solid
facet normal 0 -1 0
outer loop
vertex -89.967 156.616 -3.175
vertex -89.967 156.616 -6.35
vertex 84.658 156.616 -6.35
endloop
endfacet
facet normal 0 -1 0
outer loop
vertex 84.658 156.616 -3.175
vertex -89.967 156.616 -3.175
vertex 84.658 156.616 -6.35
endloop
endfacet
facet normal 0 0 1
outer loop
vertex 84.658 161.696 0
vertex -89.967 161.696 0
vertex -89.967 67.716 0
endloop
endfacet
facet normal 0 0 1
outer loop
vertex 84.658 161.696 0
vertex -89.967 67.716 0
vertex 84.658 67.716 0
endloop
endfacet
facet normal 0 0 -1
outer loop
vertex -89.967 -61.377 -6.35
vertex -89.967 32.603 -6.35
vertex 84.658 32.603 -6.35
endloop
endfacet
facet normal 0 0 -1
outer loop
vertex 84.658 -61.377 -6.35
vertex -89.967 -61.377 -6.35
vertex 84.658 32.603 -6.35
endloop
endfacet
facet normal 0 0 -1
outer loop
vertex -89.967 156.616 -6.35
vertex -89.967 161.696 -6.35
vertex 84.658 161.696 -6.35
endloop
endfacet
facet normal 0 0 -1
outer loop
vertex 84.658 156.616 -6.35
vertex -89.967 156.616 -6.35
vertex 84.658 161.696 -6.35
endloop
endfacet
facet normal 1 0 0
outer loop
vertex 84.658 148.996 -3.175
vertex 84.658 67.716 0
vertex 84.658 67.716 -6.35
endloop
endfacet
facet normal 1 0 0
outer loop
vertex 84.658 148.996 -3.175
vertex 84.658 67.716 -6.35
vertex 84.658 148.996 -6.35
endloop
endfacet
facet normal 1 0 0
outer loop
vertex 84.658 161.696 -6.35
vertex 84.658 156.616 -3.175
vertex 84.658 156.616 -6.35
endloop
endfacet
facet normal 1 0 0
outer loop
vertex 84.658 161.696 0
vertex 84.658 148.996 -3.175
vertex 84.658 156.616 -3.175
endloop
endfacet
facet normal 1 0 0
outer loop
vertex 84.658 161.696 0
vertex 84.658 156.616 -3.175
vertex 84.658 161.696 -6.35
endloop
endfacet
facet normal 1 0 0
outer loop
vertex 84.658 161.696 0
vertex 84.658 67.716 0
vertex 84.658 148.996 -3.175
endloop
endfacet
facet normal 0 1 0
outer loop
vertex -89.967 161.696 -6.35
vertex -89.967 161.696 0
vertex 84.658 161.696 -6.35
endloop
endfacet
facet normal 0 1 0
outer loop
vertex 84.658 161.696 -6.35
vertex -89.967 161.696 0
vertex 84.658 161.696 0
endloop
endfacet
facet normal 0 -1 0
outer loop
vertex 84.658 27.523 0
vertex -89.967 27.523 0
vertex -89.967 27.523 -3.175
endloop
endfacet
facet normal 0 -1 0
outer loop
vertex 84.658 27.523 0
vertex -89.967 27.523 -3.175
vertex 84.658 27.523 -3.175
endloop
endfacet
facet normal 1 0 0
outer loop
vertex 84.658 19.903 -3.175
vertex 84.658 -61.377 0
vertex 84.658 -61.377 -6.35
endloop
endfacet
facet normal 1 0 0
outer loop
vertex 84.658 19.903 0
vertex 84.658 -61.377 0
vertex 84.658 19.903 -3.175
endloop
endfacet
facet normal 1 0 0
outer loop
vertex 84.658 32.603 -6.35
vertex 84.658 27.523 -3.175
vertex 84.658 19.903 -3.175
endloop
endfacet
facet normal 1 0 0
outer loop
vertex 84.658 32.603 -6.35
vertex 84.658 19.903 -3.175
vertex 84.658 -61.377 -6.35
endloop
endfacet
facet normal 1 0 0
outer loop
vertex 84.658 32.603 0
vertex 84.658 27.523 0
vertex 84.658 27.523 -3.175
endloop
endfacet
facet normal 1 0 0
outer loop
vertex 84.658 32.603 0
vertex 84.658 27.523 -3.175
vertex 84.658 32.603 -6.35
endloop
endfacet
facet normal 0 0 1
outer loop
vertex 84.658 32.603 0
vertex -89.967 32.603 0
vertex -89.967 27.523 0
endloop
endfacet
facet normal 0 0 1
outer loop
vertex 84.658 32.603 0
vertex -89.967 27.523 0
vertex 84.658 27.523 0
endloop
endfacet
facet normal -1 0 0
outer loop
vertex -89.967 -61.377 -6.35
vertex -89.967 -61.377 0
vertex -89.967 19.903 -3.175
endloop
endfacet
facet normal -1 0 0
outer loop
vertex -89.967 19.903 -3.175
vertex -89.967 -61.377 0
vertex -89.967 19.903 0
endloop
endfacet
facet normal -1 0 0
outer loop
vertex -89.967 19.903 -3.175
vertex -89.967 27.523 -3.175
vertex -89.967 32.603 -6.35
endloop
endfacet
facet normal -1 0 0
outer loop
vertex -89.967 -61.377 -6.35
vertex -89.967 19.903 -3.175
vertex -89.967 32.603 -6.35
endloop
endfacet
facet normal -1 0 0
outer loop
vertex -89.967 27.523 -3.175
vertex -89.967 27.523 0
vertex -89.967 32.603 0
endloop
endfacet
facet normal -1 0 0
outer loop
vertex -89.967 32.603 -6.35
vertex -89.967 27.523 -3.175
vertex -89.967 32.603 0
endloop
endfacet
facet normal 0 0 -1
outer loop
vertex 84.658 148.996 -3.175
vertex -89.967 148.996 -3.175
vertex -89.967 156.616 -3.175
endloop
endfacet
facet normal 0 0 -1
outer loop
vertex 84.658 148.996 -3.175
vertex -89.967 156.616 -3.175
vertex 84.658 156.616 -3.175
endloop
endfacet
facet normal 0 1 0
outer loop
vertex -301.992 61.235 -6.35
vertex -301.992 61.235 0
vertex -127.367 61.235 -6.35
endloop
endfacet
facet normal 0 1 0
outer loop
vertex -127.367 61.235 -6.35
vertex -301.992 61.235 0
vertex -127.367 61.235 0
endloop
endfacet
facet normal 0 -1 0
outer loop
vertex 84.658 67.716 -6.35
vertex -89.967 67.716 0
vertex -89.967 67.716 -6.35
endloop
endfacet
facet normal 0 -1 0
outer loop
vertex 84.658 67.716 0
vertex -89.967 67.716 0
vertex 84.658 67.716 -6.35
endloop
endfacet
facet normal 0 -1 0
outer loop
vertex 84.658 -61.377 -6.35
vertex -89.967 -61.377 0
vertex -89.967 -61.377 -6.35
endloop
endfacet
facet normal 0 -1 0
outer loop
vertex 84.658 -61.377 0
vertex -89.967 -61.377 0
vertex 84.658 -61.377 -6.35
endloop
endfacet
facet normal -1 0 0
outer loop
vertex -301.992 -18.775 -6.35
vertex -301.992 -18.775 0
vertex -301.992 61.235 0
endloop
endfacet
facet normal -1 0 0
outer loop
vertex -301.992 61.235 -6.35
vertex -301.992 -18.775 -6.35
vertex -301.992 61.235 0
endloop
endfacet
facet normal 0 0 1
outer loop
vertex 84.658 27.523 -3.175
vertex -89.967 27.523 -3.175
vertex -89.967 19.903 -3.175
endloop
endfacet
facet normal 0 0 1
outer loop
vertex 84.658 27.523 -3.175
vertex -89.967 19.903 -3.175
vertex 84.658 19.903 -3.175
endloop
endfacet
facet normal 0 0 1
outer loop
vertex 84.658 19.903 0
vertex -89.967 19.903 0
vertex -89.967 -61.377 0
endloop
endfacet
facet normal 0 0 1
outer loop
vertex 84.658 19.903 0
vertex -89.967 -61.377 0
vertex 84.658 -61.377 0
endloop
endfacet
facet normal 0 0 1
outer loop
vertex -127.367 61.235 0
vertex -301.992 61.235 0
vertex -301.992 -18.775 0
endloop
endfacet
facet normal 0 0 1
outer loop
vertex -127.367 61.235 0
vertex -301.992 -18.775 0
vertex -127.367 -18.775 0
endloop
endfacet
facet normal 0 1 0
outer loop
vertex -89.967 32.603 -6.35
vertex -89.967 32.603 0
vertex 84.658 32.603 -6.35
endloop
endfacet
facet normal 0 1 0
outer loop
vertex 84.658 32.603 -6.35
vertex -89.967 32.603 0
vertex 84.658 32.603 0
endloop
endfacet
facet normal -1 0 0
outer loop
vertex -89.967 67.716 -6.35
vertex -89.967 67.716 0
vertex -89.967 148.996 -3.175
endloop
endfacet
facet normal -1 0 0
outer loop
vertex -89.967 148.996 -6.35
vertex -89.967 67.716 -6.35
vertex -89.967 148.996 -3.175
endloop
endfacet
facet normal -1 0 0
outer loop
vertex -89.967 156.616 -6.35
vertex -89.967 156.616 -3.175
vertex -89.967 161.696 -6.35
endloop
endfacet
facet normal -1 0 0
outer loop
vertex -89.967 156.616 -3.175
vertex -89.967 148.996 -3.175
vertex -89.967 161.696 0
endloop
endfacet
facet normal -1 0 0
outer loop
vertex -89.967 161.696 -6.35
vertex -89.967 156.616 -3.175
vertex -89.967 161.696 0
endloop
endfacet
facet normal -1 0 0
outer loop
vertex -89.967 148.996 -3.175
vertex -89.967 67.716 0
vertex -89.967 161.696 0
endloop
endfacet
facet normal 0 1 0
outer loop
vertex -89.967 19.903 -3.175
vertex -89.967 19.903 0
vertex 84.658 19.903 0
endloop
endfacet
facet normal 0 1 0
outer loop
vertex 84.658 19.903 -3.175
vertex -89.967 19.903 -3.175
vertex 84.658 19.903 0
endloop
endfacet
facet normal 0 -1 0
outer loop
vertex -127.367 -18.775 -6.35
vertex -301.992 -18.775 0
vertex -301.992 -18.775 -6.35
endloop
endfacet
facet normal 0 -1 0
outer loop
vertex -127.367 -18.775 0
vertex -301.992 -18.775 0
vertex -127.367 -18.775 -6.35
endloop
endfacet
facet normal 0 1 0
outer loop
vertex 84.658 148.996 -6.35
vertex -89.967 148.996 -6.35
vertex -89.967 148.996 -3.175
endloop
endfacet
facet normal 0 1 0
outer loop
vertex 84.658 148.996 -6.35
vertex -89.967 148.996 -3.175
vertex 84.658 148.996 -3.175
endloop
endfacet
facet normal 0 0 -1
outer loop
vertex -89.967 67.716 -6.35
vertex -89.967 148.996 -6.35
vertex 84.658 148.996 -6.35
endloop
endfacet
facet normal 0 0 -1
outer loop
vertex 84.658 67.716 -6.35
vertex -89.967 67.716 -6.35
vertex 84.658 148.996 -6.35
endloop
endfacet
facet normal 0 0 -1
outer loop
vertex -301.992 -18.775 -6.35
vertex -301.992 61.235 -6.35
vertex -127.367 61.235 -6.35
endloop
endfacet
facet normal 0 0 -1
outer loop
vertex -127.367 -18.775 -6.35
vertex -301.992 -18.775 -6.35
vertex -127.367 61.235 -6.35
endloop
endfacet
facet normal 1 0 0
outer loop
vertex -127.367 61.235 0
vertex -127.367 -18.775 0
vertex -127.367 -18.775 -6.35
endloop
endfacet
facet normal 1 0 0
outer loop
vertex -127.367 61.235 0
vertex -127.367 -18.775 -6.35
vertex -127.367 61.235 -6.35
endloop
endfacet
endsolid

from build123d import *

# Parameters (mm, degrees)
F0_W     = 174.625
F0_H     = 93.98
F1_DEPTH = 6.35
F2_W     = 174.625
F2_H     = 80.01
F3_DEPTH = 6.35
F4_W     = 174.625
F4_H     = 7.62
F5_DEPTH = 3.175
F6_W     = 174.625
F6_H     = 7.62
F7_DEPTH = 3.175


with BuildPart() as f1:
    # F0 (on Top) → F1 (new body)
    with BuildSketch(Plane.XY):
        with Locations((-2.654361, -14.38745)):
            Rectangle(F0_W, F0_H)
        with Locations((-2.654361, 114.706321)):
            Rectangle(F0_W, F0_H)
    extrude(amount=-F1_DEPTH)

    # F4 (on face) → F5 (cut)
    with BuildSketch(Plane.XY):
        with Locations((-2.654361, 23.71255)):
            Rectangle(F4_W, F4_H)
    extrude(amount=-F5_DEPTH, mode=Mode.SUBTRACT)

    # F6 (on face) → F7 (cut)
    with BuildSketch(Plane(origin=(0, 0, -6.35), x_dir=(1, 0, 0), z_dir=(0, 0, -1))):
        with Locations((-2.654361, -152.806321)):
            Rectangle(F6_W, F6_H)
    extrude(amount=-F7_DEPTH, mode=Mode.SUBTRACT)


with BuildPart() as f3:
    # F2 (on Top) → F3 (new body)
    with BuildSketch(Plane.XY):
        with Locations((-214.679427, 21.230439)):
            Rectangle(F2_W, F2_H)
    extrude(amount=-F3_DEPTH)


solid = Compound([f1.part, f3.part])
